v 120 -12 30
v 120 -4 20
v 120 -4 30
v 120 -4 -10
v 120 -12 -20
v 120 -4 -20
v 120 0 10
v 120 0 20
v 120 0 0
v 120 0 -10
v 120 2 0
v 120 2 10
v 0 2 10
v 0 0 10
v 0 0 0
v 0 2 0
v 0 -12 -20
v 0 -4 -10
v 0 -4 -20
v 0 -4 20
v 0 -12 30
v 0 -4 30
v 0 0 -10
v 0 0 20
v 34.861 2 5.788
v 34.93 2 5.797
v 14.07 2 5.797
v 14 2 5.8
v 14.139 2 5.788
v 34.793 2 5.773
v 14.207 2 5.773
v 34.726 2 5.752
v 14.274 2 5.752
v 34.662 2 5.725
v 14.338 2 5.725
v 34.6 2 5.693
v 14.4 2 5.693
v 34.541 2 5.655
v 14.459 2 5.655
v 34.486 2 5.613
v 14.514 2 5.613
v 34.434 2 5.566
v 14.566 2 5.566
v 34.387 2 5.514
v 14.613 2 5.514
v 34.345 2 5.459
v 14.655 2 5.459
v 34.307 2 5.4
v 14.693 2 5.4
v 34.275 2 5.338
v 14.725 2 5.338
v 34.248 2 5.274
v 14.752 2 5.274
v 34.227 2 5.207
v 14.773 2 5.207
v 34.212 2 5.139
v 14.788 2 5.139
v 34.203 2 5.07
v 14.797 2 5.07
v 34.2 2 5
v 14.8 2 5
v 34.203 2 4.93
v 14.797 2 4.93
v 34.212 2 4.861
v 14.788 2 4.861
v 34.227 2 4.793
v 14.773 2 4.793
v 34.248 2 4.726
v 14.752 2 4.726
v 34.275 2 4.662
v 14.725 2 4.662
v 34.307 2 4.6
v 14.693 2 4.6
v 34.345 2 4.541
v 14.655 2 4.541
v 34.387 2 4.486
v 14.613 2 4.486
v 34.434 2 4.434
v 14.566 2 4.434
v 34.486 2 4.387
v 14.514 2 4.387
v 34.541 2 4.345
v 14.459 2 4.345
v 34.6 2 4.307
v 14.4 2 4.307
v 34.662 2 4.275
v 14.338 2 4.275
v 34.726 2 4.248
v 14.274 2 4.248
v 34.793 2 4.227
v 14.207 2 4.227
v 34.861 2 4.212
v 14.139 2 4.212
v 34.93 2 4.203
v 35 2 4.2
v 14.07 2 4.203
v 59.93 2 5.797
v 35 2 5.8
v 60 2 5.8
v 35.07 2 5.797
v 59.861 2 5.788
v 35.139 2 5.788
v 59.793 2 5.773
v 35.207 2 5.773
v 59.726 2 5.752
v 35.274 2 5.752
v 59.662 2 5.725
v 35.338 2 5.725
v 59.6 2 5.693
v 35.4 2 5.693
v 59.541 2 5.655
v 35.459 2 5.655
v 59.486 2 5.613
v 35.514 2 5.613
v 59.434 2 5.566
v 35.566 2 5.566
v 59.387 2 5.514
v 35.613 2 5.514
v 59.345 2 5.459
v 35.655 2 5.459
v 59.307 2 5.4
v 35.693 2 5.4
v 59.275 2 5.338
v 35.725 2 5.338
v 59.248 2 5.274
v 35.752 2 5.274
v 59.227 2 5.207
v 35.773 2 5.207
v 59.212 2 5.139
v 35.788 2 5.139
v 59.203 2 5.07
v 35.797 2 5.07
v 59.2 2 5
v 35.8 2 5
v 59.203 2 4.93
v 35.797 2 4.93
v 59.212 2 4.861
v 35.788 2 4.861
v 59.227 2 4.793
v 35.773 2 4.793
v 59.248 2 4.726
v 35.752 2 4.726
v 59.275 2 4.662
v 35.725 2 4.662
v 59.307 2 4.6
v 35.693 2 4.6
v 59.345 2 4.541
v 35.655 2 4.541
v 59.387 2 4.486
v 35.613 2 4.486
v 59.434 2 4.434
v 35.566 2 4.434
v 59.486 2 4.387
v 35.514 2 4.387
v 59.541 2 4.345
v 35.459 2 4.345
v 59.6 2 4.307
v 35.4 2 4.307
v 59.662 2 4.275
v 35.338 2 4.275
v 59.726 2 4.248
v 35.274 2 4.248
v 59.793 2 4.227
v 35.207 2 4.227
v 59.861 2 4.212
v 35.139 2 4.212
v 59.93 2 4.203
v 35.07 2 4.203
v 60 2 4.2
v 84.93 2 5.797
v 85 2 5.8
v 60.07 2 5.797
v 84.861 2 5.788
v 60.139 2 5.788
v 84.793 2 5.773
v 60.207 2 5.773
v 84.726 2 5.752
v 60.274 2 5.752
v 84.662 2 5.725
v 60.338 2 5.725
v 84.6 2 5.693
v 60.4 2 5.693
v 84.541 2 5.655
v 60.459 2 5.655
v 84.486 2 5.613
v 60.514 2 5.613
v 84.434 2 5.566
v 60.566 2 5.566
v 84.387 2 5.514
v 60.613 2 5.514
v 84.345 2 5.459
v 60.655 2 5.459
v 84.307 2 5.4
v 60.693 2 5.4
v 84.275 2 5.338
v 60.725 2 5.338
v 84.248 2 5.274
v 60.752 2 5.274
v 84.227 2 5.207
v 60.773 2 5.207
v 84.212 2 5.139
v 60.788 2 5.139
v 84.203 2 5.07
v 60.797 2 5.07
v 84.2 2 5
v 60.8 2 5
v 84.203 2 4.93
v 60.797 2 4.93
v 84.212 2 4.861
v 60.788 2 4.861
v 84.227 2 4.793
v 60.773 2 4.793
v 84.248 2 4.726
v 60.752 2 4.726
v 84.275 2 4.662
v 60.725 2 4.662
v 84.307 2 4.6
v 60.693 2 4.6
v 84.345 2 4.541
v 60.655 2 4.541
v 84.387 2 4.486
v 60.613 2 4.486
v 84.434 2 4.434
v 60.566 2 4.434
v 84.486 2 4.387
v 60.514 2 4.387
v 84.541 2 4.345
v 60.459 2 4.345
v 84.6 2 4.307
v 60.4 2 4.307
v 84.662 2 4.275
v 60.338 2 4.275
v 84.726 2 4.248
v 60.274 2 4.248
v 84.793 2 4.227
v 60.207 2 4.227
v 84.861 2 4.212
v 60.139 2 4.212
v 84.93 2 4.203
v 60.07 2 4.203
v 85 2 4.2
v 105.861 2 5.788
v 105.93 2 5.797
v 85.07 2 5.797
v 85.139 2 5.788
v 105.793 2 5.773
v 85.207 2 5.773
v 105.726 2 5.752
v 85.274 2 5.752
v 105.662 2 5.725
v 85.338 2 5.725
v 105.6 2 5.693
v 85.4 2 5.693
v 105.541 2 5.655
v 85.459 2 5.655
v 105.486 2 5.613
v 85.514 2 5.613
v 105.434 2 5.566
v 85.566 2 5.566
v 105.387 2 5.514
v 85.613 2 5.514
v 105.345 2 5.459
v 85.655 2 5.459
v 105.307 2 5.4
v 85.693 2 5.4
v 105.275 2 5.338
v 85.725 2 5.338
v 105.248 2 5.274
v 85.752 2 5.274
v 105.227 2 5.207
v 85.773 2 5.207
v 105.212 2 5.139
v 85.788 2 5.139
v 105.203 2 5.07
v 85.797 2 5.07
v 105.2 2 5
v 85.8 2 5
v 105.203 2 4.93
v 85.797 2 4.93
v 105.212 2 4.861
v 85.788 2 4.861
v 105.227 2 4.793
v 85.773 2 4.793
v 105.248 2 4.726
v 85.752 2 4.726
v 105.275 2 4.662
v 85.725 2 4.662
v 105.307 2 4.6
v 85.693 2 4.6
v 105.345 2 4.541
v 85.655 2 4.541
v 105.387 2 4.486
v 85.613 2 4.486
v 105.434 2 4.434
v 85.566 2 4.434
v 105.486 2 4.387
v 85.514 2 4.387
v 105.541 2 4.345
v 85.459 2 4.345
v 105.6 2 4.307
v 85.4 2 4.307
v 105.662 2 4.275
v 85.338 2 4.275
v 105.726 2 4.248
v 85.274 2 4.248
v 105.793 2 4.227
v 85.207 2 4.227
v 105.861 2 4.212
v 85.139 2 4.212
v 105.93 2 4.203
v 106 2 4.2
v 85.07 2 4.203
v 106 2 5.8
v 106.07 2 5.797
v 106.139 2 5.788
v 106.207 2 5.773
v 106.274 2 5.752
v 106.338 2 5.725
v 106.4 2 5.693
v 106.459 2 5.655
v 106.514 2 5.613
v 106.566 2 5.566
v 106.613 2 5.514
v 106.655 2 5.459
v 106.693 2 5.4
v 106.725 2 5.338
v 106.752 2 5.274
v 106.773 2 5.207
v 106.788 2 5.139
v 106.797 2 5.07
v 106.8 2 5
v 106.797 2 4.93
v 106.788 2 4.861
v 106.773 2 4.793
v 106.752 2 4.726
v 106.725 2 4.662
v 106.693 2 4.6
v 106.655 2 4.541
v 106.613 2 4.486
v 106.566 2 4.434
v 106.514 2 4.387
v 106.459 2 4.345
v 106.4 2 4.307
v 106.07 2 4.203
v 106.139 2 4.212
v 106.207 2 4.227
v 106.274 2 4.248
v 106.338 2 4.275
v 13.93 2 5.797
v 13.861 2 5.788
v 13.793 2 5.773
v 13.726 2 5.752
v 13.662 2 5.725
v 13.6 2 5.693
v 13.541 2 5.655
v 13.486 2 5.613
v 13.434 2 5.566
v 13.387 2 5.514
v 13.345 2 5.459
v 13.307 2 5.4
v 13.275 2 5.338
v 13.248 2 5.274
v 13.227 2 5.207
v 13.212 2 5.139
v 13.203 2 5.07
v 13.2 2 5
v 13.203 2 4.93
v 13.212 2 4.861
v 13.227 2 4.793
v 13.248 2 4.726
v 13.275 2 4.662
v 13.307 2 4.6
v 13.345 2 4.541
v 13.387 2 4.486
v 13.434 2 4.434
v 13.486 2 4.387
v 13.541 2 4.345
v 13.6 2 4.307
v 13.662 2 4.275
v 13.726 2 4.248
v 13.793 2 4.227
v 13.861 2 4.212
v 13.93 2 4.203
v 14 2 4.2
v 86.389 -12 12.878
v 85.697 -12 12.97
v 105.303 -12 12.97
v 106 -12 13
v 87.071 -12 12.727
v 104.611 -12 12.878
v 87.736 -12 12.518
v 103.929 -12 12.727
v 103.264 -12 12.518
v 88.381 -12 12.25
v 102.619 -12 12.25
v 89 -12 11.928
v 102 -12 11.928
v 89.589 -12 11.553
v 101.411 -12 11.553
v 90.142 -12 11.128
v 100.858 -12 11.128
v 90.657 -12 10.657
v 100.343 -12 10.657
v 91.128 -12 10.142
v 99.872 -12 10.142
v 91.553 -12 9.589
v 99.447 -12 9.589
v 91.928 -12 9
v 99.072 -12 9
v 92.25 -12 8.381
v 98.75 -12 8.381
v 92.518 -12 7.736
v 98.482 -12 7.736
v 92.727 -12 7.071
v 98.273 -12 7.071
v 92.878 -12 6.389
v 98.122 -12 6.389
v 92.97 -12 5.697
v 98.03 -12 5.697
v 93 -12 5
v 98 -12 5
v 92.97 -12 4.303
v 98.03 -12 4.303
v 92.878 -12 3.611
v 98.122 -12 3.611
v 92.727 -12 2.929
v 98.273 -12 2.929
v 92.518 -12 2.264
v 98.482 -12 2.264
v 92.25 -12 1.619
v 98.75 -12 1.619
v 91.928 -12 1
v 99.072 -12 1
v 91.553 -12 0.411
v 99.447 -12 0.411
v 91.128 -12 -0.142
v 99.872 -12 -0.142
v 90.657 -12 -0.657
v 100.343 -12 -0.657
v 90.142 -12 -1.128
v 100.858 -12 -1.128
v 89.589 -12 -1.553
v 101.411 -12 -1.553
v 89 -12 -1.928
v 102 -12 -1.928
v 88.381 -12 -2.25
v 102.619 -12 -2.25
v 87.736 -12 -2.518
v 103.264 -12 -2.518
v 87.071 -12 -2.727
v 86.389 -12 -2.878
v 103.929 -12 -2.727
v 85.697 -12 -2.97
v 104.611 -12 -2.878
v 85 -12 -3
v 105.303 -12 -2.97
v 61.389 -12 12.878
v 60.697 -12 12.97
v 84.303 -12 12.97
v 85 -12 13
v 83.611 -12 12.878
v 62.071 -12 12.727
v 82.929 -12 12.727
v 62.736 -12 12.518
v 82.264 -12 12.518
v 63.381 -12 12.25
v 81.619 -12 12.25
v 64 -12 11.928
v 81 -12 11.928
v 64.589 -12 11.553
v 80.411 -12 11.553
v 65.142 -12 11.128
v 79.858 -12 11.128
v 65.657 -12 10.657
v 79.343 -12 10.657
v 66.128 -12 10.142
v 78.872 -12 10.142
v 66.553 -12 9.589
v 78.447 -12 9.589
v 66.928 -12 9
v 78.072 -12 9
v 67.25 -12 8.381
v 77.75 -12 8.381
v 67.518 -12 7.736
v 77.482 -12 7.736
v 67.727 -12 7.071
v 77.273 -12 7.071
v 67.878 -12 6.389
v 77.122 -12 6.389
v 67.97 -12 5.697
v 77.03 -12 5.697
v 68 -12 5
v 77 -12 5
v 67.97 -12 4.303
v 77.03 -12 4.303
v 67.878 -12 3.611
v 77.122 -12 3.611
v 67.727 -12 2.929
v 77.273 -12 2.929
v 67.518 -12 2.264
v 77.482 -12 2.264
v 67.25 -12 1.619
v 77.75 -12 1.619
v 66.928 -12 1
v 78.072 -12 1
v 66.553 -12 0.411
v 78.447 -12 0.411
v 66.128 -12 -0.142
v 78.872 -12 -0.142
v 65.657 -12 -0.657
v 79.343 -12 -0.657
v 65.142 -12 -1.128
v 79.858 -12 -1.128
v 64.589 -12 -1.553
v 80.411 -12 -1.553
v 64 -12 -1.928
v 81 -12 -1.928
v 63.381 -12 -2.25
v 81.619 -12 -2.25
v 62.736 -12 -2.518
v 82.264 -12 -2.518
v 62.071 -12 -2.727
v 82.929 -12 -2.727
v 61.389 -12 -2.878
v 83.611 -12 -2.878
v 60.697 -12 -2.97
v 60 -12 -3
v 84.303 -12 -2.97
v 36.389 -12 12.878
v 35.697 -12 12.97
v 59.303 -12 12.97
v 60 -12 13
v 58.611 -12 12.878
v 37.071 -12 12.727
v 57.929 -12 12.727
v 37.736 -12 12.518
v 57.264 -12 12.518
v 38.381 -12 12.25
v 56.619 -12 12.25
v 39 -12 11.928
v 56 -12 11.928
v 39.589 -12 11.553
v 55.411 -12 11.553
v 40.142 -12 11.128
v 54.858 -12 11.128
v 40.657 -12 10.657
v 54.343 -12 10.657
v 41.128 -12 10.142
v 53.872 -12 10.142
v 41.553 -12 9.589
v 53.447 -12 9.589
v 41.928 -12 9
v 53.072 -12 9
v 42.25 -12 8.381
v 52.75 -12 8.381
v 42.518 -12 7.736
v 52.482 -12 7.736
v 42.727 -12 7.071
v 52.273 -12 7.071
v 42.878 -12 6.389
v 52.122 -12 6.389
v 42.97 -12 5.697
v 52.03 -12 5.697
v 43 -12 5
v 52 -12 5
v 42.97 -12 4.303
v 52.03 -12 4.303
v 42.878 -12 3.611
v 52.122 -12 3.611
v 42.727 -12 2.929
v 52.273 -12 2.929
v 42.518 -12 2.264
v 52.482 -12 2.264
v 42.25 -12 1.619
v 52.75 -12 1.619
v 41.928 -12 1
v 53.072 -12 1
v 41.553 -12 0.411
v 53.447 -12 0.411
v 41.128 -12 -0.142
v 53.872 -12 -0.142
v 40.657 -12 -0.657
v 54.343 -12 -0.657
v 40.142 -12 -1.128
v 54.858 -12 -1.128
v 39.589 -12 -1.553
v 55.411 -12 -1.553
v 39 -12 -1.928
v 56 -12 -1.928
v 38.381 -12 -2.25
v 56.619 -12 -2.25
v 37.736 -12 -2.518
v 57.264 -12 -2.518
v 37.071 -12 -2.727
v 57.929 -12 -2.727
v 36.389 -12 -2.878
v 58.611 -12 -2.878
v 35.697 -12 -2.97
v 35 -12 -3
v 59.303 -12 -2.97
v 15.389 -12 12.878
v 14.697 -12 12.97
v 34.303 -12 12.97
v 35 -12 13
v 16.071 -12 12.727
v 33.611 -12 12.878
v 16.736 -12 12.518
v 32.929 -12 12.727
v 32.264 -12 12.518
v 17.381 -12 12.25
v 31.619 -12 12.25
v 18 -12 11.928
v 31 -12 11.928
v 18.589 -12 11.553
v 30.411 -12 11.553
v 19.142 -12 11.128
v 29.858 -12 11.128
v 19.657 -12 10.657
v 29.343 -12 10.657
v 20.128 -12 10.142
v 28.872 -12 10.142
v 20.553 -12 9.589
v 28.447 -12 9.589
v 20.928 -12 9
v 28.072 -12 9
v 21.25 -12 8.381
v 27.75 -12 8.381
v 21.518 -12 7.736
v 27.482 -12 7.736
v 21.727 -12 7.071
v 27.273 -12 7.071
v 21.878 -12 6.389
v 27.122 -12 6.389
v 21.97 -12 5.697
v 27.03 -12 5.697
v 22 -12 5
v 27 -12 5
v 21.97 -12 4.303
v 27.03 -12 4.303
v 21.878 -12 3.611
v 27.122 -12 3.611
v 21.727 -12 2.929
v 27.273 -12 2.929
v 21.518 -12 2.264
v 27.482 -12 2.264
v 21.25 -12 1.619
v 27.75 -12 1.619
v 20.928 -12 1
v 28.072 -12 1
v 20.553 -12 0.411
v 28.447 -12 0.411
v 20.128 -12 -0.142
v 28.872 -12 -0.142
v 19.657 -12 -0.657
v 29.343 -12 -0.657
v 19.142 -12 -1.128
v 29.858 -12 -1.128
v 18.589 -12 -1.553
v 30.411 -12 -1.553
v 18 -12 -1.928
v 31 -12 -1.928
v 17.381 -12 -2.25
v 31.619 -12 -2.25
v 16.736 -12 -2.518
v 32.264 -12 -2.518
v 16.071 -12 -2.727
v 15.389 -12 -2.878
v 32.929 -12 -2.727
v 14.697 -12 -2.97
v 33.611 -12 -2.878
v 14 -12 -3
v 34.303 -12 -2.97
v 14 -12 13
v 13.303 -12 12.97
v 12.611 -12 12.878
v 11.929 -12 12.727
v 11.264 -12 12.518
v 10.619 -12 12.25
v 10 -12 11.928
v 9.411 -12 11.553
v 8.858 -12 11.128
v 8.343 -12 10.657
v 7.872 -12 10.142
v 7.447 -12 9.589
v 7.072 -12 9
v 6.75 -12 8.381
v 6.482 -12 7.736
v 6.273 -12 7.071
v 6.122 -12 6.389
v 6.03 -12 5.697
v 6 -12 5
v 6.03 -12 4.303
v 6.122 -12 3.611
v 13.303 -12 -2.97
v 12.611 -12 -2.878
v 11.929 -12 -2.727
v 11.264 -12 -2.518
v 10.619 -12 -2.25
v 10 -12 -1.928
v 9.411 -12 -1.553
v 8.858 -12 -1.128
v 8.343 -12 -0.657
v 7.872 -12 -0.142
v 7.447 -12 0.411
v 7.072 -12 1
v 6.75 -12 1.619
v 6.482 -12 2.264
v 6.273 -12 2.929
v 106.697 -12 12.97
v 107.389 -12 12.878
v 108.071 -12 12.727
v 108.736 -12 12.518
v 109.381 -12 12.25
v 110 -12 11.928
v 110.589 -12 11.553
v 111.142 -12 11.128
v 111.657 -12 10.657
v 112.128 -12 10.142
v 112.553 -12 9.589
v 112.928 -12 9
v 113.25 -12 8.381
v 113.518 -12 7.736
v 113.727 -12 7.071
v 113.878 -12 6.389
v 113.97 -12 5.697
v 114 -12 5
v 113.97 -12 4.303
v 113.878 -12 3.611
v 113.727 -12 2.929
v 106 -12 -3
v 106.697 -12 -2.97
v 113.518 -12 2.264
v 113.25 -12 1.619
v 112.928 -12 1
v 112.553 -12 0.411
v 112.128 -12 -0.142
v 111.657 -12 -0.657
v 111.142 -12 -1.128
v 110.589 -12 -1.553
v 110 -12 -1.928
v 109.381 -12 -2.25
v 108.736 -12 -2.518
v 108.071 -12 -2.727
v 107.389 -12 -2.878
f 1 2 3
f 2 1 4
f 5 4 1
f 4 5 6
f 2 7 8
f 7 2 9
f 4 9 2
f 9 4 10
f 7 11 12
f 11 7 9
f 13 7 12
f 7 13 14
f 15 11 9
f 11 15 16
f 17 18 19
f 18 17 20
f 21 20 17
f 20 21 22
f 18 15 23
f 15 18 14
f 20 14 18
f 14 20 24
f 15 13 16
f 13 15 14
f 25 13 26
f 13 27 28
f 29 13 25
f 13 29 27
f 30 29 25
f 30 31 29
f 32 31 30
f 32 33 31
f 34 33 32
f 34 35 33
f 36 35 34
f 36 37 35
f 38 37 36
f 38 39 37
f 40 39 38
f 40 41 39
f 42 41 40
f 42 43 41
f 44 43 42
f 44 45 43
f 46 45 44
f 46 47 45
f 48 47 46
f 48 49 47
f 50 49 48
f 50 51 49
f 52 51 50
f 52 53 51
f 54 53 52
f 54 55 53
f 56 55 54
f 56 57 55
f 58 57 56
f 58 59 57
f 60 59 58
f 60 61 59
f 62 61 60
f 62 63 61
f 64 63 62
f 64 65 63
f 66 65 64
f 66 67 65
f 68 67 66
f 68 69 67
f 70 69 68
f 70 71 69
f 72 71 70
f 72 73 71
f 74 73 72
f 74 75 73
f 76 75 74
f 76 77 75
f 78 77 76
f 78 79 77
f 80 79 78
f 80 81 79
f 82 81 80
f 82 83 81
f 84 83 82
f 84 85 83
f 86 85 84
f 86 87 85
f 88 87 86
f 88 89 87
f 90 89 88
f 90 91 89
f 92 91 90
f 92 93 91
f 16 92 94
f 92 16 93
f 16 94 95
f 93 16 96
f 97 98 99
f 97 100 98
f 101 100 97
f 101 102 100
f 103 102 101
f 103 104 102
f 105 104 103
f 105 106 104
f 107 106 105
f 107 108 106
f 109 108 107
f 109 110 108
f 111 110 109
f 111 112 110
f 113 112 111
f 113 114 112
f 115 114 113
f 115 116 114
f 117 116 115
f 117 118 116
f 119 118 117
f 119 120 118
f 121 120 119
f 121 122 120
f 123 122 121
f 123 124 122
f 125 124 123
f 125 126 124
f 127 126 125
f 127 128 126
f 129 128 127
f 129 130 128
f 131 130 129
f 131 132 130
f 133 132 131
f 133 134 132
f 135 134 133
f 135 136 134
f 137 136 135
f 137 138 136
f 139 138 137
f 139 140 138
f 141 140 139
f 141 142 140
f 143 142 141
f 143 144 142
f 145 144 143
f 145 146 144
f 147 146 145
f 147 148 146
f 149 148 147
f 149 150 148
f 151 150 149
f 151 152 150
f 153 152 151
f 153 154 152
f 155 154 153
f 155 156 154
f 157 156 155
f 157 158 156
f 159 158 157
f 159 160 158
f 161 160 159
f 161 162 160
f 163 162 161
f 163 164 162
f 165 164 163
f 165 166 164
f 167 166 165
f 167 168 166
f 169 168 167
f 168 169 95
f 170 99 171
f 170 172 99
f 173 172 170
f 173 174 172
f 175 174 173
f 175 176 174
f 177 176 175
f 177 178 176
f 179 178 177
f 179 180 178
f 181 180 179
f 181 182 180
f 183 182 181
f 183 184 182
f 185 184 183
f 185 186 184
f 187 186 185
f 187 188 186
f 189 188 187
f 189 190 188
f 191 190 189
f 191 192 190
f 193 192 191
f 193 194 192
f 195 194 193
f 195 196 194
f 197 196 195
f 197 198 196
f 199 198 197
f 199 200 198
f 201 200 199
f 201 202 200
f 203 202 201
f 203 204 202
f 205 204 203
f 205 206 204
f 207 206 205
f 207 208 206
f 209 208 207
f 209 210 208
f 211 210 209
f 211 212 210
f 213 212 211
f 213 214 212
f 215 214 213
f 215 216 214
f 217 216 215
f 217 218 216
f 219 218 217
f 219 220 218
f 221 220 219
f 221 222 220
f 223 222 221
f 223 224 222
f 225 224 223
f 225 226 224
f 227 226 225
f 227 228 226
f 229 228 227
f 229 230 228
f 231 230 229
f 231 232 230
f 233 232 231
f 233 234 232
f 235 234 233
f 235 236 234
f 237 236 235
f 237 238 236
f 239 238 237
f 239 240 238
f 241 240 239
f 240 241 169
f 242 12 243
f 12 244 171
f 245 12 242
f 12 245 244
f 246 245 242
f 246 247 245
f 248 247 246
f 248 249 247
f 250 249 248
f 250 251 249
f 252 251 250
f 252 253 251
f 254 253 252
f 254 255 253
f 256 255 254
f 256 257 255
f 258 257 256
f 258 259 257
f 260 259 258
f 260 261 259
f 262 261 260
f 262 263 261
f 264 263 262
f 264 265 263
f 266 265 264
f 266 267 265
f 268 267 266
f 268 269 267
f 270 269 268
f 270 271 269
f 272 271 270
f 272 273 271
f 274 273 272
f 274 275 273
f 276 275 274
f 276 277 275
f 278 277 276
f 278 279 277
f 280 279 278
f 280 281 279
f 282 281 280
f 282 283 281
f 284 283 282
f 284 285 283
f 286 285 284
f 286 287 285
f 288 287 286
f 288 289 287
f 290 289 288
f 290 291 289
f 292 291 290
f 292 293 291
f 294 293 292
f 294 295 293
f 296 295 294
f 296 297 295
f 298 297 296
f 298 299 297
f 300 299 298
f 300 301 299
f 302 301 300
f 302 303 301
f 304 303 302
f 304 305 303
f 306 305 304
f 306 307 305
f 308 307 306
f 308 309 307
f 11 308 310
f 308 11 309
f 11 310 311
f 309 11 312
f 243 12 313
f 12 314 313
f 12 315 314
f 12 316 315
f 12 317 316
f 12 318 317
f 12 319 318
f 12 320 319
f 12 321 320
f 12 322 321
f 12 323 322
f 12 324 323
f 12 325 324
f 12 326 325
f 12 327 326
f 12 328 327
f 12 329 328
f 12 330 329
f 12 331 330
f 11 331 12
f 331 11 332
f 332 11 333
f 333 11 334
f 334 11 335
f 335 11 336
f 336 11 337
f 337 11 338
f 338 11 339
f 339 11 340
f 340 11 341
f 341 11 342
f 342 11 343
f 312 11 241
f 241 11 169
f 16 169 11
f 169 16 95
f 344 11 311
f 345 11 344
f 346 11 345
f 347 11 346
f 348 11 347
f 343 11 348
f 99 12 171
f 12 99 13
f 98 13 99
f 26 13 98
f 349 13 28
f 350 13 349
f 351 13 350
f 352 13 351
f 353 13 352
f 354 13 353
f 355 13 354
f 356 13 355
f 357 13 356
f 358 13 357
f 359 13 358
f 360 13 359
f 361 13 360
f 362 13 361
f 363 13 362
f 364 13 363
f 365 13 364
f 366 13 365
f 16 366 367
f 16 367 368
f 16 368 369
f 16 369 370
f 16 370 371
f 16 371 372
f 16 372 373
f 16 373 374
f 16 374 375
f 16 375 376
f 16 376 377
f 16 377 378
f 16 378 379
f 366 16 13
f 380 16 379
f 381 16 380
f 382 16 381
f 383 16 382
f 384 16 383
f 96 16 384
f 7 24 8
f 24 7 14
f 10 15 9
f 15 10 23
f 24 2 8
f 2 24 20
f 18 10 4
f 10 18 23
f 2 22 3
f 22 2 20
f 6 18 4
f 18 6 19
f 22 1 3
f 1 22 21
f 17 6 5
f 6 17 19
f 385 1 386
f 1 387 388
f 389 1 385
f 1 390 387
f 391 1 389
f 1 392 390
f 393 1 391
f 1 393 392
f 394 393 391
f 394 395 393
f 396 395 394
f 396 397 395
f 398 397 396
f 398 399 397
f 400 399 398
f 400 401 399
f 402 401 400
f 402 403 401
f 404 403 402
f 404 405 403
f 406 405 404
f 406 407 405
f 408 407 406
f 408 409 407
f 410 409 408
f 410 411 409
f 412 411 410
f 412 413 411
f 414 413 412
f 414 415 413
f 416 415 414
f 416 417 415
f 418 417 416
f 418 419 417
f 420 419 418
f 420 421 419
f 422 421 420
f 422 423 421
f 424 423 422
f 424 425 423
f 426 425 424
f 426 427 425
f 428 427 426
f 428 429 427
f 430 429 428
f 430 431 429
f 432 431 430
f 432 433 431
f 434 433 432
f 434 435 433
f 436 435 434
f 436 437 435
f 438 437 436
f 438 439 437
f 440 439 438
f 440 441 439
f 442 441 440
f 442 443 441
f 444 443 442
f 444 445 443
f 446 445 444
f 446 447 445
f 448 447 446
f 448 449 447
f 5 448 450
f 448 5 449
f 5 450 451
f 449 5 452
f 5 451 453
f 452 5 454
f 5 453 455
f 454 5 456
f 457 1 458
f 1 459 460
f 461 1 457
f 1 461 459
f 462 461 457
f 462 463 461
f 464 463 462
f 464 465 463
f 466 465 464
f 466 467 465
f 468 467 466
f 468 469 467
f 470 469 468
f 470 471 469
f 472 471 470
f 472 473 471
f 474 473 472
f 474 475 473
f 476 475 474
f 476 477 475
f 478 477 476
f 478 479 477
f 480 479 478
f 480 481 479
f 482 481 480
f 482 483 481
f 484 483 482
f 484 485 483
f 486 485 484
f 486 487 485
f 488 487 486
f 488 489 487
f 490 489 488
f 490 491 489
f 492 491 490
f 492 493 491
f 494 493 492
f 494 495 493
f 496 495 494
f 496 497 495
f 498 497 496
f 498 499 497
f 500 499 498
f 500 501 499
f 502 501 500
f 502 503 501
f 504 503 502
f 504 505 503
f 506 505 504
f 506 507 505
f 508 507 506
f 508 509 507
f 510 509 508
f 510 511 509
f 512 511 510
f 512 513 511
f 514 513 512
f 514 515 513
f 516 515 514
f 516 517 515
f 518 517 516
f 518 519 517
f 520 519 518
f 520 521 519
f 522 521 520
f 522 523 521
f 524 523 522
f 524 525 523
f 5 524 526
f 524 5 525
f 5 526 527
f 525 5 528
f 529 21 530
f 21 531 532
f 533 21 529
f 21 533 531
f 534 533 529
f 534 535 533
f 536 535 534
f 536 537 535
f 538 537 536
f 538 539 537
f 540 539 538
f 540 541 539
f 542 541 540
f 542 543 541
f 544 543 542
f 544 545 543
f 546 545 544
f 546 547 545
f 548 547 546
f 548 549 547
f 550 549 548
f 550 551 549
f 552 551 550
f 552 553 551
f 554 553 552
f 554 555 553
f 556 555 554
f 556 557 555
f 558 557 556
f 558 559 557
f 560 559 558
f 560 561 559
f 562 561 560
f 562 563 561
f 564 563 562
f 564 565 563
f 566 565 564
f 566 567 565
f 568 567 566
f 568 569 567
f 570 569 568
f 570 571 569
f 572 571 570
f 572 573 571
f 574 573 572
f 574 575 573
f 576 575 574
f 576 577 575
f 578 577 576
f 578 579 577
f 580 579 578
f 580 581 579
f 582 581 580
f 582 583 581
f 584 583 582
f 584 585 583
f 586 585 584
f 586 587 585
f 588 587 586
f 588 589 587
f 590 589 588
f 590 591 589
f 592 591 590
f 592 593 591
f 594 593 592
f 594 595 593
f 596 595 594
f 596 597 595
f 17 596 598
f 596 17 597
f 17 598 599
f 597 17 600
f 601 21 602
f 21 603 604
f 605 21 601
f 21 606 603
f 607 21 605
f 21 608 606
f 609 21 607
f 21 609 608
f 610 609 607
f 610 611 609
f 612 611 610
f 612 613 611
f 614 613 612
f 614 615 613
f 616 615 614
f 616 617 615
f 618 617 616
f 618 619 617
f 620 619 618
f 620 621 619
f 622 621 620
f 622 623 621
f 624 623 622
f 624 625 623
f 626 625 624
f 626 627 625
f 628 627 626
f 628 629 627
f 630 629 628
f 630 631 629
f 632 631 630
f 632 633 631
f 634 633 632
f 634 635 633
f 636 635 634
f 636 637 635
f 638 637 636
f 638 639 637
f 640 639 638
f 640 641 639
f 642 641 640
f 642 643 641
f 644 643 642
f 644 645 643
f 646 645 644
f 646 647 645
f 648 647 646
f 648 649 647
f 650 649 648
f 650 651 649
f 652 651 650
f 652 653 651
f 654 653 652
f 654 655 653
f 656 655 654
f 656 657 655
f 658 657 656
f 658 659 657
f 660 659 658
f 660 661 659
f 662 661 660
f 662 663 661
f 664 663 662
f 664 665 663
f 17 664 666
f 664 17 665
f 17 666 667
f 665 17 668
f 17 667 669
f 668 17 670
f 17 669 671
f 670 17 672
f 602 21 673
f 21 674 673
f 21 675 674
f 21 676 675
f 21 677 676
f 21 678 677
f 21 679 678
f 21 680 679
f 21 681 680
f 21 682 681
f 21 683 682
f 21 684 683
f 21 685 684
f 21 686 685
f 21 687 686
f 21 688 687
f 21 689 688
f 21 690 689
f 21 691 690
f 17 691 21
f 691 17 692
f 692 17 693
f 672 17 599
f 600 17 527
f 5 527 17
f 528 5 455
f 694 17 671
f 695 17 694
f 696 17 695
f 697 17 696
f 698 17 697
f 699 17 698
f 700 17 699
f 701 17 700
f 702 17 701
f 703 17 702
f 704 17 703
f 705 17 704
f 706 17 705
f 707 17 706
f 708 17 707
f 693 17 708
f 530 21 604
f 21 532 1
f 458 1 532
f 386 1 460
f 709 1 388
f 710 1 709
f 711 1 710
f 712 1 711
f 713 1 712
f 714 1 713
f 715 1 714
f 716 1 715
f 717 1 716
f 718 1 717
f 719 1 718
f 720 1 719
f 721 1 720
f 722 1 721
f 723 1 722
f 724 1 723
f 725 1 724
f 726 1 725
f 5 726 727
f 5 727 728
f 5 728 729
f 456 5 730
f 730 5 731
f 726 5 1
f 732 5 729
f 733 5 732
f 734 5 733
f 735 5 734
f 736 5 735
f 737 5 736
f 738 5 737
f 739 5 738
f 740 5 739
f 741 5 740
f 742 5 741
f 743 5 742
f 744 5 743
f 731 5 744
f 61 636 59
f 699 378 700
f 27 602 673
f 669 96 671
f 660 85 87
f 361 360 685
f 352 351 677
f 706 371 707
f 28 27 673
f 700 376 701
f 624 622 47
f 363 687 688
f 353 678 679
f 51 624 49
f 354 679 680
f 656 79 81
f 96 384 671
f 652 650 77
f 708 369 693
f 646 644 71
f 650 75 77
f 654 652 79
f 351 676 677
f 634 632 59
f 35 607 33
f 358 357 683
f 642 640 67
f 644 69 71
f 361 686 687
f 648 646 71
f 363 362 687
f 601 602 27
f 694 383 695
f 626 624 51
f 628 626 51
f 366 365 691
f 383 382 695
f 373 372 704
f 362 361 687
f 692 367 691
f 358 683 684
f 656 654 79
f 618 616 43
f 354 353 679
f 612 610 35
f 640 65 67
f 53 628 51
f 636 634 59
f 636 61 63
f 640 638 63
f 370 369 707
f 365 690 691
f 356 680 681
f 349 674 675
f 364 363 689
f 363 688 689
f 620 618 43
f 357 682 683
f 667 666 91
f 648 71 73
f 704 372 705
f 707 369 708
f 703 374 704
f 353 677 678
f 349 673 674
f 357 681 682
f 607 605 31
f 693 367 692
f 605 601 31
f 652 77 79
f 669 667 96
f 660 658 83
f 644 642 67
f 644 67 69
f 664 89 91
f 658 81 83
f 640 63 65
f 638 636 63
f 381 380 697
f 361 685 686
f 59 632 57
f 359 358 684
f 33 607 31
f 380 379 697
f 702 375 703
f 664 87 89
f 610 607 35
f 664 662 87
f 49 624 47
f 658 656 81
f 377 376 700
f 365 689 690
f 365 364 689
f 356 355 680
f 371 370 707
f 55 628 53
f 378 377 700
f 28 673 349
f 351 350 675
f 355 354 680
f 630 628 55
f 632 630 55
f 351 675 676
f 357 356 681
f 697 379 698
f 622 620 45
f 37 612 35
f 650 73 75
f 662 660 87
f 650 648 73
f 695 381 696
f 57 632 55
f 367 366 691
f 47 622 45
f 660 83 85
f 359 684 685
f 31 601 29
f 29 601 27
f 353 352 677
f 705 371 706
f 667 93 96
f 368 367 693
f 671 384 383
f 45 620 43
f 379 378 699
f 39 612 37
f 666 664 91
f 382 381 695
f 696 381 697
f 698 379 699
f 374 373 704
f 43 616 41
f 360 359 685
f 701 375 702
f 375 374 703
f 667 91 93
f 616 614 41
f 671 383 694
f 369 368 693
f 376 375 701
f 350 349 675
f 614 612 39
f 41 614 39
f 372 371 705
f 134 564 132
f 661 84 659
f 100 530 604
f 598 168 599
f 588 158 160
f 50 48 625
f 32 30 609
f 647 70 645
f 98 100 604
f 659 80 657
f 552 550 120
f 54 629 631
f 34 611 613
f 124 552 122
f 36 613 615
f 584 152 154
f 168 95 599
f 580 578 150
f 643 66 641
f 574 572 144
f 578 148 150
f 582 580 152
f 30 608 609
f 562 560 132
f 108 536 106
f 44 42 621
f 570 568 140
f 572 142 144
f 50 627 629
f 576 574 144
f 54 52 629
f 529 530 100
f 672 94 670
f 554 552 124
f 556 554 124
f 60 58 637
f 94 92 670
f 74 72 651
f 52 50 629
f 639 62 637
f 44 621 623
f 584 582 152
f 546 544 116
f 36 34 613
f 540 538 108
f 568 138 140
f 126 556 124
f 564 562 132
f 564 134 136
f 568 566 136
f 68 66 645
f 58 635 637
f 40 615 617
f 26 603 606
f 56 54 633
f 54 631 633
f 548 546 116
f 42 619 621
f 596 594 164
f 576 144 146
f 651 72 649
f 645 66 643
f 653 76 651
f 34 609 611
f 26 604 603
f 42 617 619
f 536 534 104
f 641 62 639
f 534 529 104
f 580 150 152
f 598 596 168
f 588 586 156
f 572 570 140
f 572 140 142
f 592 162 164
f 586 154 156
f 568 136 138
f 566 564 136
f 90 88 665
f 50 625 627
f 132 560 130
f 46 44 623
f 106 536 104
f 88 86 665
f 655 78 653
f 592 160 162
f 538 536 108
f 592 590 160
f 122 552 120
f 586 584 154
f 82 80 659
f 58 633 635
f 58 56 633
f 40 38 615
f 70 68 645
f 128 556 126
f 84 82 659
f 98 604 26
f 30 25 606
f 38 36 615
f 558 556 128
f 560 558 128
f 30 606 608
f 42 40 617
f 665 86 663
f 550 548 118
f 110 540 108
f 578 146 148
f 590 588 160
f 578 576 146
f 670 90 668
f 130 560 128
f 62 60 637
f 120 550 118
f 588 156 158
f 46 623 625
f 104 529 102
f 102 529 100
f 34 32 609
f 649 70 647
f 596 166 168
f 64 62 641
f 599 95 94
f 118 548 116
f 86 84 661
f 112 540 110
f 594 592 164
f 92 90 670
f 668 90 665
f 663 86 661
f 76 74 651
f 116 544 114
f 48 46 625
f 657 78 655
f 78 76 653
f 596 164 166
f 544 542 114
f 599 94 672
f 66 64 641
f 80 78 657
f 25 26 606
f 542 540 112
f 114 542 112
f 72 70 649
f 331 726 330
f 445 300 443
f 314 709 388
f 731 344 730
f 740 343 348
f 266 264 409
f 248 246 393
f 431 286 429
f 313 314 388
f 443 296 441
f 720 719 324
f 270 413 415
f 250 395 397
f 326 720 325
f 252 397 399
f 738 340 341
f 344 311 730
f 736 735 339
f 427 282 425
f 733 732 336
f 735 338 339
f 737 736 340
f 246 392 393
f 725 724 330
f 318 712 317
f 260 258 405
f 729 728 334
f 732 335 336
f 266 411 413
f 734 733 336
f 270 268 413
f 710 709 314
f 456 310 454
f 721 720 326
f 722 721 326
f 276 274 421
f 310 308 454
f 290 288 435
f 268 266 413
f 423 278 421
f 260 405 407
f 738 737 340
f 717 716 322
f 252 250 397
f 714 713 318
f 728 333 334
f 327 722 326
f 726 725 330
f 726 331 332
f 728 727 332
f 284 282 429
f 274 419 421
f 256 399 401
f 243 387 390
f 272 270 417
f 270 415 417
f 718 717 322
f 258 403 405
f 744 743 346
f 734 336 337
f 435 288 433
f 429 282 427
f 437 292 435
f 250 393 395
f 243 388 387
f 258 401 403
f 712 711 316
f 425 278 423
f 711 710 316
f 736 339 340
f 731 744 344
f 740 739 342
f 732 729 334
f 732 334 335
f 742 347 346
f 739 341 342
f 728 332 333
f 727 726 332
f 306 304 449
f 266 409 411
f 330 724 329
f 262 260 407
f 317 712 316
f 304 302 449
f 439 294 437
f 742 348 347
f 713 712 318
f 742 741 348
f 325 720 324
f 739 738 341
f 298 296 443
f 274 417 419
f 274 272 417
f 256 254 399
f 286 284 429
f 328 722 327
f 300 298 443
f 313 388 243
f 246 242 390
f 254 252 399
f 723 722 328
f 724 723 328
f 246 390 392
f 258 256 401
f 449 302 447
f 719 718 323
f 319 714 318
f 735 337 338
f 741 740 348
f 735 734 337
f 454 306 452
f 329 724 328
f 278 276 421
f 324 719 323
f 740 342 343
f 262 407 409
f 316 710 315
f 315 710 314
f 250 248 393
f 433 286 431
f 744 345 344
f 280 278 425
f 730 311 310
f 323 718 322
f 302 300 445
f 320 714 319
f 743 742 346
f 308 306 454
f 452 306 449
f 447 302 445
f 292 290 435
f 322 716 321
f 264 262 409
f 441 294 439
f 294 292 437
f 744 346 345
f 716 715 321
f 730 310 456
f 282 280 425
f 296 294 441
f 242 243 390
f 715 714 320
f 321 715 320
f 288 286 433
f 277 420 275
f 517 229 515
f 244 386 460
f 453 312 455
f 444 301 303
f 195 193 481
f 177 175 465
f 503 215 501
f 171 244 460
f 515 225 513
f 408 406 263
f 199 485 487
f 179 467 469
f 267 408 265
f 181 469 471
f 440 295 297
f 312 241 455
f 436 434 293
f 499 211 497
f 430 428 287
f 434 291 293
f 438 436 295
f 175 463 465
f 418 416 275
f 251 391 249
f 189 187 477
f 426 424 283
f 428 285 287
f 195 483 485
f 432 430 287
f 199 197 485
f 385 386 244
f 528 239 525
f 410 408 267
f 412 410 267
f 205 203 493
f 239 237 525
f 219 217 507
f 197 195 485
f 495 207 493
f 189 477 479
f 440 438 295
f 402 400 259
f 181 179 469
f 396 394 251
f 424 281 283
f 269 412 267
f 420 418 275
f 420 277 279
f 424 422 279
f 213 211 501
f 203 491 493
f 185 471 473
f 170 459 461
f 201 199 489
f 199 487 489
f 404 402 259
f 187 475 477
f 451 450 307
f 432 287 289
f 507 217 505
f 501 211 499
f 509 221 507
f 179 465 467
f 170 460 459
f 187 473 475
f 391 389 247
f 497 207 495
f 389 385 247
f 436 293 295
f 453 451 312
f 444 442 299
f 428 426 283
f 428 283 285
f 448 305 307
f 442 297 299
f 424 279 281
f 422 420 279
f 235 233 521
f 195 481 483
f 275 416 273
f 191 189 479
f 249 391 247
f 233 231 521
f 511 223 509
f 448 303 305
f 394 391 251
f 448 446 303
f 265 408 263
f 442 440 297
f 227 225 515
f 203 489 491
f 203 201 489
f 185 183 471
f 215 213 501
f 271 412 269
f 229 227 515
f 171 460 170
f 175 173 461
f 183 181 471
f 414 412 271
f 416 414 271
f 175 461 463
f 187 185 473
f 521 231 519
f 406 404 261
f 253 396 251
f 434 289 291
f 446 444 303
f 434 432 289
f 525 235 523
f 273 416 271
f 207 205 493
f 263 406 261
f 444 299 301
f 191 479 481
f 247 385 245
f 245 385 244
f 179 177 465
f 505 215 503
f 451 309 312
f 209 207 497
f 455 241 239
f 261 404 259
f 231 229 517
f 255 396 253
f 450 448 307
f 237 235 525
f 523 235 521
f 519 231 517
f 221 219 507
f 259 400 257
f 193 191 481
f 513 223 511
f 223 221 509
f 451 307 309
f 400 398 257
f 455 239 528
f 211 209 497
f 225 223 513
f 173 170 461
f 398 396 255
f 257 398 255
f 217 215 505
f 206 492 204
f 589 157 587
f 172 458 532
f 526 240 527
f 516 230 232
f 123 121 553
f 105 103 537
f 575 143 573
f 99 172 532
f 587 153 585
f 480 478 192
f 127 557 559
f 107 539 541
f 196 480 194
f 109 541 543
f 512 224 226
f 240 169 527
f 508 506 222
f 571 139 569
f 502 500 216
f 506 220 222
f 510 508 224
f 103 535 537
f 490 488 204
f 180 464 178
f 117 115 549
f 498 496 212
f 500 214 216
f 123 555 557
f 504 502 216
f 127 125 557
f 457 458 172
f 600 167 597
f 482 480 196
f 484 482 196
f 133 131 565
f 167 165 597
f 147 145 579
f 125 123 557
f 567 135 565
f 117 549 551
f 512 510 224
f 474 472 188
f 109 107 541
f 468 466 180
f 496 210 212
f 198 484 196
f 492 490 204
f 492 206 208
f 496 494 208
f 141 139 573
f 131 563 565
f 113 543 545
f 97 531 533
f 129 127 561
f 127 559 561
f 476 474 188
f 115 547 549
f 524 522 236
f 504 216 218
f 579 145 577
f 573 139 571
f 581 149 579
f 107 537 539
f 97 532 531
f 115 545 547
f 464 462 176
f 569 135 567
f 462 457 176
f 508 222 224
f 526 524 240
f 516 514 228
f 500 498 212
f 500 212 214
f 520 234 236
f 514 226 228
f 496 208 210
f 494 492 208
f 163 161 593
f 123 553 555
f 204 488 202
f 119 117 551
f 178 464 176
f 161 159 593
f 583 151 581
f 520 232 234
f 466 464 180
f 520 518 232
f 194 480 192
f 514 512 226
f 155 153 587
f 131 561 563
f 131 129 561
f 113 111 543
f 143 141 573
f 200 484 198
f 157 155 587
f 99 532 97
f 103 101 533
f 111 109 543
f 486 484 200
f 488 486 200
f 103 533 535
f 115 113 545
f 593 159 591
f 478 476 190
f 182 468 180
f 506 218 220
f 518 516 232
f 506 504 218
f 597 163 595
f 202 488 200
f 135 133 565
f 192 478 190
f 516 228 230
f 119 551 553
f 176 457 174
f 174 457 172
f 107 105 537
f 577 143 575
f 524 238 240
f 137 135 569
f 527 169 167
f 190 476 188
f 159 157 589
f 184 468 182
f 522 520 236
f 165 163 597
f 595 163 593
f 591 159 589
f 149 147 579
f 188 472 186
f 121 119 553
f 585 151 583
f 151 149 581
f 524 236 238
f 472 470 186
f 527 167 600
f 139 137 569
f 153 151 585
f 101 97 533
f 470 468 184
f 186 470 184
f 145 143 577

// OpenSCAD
//TuergriffFliegengitter

$fn=72;

w=120;
t=2;
d1=4;
d2=8;
h=10;

module griff() {
cube([w,t,h]);

translate([0,-d1,-h])
cube([w,d1,h*3]);

translate([0,-d2-d1,-h*2])
cube([w,d2,h*5]);
}

module loch() {
    rotate([90,0,0])
    color("blue")
    cylinder(h=t+d1+d2, r=5);
}

ls=6;
lsg=17;

module schraube() {
translate([0,t,h/2])
rotate([90,0,0])
color("red")
cylinder(h=t+d1+d2, r1=0.8, r2=8);
}

module schrauben() {
    translate([8+t*3,0,0])
    schraube();
    
    translate([35,0,0])
    schraube();
    
    translate([w-8-t*3,0,0])
    schraube();
    
    translate([w-35,0,0])
    schraube();
    
    translate([w/2,0,0])
    schraube();
}

difference() {
   griff();
    schrauben();
}
